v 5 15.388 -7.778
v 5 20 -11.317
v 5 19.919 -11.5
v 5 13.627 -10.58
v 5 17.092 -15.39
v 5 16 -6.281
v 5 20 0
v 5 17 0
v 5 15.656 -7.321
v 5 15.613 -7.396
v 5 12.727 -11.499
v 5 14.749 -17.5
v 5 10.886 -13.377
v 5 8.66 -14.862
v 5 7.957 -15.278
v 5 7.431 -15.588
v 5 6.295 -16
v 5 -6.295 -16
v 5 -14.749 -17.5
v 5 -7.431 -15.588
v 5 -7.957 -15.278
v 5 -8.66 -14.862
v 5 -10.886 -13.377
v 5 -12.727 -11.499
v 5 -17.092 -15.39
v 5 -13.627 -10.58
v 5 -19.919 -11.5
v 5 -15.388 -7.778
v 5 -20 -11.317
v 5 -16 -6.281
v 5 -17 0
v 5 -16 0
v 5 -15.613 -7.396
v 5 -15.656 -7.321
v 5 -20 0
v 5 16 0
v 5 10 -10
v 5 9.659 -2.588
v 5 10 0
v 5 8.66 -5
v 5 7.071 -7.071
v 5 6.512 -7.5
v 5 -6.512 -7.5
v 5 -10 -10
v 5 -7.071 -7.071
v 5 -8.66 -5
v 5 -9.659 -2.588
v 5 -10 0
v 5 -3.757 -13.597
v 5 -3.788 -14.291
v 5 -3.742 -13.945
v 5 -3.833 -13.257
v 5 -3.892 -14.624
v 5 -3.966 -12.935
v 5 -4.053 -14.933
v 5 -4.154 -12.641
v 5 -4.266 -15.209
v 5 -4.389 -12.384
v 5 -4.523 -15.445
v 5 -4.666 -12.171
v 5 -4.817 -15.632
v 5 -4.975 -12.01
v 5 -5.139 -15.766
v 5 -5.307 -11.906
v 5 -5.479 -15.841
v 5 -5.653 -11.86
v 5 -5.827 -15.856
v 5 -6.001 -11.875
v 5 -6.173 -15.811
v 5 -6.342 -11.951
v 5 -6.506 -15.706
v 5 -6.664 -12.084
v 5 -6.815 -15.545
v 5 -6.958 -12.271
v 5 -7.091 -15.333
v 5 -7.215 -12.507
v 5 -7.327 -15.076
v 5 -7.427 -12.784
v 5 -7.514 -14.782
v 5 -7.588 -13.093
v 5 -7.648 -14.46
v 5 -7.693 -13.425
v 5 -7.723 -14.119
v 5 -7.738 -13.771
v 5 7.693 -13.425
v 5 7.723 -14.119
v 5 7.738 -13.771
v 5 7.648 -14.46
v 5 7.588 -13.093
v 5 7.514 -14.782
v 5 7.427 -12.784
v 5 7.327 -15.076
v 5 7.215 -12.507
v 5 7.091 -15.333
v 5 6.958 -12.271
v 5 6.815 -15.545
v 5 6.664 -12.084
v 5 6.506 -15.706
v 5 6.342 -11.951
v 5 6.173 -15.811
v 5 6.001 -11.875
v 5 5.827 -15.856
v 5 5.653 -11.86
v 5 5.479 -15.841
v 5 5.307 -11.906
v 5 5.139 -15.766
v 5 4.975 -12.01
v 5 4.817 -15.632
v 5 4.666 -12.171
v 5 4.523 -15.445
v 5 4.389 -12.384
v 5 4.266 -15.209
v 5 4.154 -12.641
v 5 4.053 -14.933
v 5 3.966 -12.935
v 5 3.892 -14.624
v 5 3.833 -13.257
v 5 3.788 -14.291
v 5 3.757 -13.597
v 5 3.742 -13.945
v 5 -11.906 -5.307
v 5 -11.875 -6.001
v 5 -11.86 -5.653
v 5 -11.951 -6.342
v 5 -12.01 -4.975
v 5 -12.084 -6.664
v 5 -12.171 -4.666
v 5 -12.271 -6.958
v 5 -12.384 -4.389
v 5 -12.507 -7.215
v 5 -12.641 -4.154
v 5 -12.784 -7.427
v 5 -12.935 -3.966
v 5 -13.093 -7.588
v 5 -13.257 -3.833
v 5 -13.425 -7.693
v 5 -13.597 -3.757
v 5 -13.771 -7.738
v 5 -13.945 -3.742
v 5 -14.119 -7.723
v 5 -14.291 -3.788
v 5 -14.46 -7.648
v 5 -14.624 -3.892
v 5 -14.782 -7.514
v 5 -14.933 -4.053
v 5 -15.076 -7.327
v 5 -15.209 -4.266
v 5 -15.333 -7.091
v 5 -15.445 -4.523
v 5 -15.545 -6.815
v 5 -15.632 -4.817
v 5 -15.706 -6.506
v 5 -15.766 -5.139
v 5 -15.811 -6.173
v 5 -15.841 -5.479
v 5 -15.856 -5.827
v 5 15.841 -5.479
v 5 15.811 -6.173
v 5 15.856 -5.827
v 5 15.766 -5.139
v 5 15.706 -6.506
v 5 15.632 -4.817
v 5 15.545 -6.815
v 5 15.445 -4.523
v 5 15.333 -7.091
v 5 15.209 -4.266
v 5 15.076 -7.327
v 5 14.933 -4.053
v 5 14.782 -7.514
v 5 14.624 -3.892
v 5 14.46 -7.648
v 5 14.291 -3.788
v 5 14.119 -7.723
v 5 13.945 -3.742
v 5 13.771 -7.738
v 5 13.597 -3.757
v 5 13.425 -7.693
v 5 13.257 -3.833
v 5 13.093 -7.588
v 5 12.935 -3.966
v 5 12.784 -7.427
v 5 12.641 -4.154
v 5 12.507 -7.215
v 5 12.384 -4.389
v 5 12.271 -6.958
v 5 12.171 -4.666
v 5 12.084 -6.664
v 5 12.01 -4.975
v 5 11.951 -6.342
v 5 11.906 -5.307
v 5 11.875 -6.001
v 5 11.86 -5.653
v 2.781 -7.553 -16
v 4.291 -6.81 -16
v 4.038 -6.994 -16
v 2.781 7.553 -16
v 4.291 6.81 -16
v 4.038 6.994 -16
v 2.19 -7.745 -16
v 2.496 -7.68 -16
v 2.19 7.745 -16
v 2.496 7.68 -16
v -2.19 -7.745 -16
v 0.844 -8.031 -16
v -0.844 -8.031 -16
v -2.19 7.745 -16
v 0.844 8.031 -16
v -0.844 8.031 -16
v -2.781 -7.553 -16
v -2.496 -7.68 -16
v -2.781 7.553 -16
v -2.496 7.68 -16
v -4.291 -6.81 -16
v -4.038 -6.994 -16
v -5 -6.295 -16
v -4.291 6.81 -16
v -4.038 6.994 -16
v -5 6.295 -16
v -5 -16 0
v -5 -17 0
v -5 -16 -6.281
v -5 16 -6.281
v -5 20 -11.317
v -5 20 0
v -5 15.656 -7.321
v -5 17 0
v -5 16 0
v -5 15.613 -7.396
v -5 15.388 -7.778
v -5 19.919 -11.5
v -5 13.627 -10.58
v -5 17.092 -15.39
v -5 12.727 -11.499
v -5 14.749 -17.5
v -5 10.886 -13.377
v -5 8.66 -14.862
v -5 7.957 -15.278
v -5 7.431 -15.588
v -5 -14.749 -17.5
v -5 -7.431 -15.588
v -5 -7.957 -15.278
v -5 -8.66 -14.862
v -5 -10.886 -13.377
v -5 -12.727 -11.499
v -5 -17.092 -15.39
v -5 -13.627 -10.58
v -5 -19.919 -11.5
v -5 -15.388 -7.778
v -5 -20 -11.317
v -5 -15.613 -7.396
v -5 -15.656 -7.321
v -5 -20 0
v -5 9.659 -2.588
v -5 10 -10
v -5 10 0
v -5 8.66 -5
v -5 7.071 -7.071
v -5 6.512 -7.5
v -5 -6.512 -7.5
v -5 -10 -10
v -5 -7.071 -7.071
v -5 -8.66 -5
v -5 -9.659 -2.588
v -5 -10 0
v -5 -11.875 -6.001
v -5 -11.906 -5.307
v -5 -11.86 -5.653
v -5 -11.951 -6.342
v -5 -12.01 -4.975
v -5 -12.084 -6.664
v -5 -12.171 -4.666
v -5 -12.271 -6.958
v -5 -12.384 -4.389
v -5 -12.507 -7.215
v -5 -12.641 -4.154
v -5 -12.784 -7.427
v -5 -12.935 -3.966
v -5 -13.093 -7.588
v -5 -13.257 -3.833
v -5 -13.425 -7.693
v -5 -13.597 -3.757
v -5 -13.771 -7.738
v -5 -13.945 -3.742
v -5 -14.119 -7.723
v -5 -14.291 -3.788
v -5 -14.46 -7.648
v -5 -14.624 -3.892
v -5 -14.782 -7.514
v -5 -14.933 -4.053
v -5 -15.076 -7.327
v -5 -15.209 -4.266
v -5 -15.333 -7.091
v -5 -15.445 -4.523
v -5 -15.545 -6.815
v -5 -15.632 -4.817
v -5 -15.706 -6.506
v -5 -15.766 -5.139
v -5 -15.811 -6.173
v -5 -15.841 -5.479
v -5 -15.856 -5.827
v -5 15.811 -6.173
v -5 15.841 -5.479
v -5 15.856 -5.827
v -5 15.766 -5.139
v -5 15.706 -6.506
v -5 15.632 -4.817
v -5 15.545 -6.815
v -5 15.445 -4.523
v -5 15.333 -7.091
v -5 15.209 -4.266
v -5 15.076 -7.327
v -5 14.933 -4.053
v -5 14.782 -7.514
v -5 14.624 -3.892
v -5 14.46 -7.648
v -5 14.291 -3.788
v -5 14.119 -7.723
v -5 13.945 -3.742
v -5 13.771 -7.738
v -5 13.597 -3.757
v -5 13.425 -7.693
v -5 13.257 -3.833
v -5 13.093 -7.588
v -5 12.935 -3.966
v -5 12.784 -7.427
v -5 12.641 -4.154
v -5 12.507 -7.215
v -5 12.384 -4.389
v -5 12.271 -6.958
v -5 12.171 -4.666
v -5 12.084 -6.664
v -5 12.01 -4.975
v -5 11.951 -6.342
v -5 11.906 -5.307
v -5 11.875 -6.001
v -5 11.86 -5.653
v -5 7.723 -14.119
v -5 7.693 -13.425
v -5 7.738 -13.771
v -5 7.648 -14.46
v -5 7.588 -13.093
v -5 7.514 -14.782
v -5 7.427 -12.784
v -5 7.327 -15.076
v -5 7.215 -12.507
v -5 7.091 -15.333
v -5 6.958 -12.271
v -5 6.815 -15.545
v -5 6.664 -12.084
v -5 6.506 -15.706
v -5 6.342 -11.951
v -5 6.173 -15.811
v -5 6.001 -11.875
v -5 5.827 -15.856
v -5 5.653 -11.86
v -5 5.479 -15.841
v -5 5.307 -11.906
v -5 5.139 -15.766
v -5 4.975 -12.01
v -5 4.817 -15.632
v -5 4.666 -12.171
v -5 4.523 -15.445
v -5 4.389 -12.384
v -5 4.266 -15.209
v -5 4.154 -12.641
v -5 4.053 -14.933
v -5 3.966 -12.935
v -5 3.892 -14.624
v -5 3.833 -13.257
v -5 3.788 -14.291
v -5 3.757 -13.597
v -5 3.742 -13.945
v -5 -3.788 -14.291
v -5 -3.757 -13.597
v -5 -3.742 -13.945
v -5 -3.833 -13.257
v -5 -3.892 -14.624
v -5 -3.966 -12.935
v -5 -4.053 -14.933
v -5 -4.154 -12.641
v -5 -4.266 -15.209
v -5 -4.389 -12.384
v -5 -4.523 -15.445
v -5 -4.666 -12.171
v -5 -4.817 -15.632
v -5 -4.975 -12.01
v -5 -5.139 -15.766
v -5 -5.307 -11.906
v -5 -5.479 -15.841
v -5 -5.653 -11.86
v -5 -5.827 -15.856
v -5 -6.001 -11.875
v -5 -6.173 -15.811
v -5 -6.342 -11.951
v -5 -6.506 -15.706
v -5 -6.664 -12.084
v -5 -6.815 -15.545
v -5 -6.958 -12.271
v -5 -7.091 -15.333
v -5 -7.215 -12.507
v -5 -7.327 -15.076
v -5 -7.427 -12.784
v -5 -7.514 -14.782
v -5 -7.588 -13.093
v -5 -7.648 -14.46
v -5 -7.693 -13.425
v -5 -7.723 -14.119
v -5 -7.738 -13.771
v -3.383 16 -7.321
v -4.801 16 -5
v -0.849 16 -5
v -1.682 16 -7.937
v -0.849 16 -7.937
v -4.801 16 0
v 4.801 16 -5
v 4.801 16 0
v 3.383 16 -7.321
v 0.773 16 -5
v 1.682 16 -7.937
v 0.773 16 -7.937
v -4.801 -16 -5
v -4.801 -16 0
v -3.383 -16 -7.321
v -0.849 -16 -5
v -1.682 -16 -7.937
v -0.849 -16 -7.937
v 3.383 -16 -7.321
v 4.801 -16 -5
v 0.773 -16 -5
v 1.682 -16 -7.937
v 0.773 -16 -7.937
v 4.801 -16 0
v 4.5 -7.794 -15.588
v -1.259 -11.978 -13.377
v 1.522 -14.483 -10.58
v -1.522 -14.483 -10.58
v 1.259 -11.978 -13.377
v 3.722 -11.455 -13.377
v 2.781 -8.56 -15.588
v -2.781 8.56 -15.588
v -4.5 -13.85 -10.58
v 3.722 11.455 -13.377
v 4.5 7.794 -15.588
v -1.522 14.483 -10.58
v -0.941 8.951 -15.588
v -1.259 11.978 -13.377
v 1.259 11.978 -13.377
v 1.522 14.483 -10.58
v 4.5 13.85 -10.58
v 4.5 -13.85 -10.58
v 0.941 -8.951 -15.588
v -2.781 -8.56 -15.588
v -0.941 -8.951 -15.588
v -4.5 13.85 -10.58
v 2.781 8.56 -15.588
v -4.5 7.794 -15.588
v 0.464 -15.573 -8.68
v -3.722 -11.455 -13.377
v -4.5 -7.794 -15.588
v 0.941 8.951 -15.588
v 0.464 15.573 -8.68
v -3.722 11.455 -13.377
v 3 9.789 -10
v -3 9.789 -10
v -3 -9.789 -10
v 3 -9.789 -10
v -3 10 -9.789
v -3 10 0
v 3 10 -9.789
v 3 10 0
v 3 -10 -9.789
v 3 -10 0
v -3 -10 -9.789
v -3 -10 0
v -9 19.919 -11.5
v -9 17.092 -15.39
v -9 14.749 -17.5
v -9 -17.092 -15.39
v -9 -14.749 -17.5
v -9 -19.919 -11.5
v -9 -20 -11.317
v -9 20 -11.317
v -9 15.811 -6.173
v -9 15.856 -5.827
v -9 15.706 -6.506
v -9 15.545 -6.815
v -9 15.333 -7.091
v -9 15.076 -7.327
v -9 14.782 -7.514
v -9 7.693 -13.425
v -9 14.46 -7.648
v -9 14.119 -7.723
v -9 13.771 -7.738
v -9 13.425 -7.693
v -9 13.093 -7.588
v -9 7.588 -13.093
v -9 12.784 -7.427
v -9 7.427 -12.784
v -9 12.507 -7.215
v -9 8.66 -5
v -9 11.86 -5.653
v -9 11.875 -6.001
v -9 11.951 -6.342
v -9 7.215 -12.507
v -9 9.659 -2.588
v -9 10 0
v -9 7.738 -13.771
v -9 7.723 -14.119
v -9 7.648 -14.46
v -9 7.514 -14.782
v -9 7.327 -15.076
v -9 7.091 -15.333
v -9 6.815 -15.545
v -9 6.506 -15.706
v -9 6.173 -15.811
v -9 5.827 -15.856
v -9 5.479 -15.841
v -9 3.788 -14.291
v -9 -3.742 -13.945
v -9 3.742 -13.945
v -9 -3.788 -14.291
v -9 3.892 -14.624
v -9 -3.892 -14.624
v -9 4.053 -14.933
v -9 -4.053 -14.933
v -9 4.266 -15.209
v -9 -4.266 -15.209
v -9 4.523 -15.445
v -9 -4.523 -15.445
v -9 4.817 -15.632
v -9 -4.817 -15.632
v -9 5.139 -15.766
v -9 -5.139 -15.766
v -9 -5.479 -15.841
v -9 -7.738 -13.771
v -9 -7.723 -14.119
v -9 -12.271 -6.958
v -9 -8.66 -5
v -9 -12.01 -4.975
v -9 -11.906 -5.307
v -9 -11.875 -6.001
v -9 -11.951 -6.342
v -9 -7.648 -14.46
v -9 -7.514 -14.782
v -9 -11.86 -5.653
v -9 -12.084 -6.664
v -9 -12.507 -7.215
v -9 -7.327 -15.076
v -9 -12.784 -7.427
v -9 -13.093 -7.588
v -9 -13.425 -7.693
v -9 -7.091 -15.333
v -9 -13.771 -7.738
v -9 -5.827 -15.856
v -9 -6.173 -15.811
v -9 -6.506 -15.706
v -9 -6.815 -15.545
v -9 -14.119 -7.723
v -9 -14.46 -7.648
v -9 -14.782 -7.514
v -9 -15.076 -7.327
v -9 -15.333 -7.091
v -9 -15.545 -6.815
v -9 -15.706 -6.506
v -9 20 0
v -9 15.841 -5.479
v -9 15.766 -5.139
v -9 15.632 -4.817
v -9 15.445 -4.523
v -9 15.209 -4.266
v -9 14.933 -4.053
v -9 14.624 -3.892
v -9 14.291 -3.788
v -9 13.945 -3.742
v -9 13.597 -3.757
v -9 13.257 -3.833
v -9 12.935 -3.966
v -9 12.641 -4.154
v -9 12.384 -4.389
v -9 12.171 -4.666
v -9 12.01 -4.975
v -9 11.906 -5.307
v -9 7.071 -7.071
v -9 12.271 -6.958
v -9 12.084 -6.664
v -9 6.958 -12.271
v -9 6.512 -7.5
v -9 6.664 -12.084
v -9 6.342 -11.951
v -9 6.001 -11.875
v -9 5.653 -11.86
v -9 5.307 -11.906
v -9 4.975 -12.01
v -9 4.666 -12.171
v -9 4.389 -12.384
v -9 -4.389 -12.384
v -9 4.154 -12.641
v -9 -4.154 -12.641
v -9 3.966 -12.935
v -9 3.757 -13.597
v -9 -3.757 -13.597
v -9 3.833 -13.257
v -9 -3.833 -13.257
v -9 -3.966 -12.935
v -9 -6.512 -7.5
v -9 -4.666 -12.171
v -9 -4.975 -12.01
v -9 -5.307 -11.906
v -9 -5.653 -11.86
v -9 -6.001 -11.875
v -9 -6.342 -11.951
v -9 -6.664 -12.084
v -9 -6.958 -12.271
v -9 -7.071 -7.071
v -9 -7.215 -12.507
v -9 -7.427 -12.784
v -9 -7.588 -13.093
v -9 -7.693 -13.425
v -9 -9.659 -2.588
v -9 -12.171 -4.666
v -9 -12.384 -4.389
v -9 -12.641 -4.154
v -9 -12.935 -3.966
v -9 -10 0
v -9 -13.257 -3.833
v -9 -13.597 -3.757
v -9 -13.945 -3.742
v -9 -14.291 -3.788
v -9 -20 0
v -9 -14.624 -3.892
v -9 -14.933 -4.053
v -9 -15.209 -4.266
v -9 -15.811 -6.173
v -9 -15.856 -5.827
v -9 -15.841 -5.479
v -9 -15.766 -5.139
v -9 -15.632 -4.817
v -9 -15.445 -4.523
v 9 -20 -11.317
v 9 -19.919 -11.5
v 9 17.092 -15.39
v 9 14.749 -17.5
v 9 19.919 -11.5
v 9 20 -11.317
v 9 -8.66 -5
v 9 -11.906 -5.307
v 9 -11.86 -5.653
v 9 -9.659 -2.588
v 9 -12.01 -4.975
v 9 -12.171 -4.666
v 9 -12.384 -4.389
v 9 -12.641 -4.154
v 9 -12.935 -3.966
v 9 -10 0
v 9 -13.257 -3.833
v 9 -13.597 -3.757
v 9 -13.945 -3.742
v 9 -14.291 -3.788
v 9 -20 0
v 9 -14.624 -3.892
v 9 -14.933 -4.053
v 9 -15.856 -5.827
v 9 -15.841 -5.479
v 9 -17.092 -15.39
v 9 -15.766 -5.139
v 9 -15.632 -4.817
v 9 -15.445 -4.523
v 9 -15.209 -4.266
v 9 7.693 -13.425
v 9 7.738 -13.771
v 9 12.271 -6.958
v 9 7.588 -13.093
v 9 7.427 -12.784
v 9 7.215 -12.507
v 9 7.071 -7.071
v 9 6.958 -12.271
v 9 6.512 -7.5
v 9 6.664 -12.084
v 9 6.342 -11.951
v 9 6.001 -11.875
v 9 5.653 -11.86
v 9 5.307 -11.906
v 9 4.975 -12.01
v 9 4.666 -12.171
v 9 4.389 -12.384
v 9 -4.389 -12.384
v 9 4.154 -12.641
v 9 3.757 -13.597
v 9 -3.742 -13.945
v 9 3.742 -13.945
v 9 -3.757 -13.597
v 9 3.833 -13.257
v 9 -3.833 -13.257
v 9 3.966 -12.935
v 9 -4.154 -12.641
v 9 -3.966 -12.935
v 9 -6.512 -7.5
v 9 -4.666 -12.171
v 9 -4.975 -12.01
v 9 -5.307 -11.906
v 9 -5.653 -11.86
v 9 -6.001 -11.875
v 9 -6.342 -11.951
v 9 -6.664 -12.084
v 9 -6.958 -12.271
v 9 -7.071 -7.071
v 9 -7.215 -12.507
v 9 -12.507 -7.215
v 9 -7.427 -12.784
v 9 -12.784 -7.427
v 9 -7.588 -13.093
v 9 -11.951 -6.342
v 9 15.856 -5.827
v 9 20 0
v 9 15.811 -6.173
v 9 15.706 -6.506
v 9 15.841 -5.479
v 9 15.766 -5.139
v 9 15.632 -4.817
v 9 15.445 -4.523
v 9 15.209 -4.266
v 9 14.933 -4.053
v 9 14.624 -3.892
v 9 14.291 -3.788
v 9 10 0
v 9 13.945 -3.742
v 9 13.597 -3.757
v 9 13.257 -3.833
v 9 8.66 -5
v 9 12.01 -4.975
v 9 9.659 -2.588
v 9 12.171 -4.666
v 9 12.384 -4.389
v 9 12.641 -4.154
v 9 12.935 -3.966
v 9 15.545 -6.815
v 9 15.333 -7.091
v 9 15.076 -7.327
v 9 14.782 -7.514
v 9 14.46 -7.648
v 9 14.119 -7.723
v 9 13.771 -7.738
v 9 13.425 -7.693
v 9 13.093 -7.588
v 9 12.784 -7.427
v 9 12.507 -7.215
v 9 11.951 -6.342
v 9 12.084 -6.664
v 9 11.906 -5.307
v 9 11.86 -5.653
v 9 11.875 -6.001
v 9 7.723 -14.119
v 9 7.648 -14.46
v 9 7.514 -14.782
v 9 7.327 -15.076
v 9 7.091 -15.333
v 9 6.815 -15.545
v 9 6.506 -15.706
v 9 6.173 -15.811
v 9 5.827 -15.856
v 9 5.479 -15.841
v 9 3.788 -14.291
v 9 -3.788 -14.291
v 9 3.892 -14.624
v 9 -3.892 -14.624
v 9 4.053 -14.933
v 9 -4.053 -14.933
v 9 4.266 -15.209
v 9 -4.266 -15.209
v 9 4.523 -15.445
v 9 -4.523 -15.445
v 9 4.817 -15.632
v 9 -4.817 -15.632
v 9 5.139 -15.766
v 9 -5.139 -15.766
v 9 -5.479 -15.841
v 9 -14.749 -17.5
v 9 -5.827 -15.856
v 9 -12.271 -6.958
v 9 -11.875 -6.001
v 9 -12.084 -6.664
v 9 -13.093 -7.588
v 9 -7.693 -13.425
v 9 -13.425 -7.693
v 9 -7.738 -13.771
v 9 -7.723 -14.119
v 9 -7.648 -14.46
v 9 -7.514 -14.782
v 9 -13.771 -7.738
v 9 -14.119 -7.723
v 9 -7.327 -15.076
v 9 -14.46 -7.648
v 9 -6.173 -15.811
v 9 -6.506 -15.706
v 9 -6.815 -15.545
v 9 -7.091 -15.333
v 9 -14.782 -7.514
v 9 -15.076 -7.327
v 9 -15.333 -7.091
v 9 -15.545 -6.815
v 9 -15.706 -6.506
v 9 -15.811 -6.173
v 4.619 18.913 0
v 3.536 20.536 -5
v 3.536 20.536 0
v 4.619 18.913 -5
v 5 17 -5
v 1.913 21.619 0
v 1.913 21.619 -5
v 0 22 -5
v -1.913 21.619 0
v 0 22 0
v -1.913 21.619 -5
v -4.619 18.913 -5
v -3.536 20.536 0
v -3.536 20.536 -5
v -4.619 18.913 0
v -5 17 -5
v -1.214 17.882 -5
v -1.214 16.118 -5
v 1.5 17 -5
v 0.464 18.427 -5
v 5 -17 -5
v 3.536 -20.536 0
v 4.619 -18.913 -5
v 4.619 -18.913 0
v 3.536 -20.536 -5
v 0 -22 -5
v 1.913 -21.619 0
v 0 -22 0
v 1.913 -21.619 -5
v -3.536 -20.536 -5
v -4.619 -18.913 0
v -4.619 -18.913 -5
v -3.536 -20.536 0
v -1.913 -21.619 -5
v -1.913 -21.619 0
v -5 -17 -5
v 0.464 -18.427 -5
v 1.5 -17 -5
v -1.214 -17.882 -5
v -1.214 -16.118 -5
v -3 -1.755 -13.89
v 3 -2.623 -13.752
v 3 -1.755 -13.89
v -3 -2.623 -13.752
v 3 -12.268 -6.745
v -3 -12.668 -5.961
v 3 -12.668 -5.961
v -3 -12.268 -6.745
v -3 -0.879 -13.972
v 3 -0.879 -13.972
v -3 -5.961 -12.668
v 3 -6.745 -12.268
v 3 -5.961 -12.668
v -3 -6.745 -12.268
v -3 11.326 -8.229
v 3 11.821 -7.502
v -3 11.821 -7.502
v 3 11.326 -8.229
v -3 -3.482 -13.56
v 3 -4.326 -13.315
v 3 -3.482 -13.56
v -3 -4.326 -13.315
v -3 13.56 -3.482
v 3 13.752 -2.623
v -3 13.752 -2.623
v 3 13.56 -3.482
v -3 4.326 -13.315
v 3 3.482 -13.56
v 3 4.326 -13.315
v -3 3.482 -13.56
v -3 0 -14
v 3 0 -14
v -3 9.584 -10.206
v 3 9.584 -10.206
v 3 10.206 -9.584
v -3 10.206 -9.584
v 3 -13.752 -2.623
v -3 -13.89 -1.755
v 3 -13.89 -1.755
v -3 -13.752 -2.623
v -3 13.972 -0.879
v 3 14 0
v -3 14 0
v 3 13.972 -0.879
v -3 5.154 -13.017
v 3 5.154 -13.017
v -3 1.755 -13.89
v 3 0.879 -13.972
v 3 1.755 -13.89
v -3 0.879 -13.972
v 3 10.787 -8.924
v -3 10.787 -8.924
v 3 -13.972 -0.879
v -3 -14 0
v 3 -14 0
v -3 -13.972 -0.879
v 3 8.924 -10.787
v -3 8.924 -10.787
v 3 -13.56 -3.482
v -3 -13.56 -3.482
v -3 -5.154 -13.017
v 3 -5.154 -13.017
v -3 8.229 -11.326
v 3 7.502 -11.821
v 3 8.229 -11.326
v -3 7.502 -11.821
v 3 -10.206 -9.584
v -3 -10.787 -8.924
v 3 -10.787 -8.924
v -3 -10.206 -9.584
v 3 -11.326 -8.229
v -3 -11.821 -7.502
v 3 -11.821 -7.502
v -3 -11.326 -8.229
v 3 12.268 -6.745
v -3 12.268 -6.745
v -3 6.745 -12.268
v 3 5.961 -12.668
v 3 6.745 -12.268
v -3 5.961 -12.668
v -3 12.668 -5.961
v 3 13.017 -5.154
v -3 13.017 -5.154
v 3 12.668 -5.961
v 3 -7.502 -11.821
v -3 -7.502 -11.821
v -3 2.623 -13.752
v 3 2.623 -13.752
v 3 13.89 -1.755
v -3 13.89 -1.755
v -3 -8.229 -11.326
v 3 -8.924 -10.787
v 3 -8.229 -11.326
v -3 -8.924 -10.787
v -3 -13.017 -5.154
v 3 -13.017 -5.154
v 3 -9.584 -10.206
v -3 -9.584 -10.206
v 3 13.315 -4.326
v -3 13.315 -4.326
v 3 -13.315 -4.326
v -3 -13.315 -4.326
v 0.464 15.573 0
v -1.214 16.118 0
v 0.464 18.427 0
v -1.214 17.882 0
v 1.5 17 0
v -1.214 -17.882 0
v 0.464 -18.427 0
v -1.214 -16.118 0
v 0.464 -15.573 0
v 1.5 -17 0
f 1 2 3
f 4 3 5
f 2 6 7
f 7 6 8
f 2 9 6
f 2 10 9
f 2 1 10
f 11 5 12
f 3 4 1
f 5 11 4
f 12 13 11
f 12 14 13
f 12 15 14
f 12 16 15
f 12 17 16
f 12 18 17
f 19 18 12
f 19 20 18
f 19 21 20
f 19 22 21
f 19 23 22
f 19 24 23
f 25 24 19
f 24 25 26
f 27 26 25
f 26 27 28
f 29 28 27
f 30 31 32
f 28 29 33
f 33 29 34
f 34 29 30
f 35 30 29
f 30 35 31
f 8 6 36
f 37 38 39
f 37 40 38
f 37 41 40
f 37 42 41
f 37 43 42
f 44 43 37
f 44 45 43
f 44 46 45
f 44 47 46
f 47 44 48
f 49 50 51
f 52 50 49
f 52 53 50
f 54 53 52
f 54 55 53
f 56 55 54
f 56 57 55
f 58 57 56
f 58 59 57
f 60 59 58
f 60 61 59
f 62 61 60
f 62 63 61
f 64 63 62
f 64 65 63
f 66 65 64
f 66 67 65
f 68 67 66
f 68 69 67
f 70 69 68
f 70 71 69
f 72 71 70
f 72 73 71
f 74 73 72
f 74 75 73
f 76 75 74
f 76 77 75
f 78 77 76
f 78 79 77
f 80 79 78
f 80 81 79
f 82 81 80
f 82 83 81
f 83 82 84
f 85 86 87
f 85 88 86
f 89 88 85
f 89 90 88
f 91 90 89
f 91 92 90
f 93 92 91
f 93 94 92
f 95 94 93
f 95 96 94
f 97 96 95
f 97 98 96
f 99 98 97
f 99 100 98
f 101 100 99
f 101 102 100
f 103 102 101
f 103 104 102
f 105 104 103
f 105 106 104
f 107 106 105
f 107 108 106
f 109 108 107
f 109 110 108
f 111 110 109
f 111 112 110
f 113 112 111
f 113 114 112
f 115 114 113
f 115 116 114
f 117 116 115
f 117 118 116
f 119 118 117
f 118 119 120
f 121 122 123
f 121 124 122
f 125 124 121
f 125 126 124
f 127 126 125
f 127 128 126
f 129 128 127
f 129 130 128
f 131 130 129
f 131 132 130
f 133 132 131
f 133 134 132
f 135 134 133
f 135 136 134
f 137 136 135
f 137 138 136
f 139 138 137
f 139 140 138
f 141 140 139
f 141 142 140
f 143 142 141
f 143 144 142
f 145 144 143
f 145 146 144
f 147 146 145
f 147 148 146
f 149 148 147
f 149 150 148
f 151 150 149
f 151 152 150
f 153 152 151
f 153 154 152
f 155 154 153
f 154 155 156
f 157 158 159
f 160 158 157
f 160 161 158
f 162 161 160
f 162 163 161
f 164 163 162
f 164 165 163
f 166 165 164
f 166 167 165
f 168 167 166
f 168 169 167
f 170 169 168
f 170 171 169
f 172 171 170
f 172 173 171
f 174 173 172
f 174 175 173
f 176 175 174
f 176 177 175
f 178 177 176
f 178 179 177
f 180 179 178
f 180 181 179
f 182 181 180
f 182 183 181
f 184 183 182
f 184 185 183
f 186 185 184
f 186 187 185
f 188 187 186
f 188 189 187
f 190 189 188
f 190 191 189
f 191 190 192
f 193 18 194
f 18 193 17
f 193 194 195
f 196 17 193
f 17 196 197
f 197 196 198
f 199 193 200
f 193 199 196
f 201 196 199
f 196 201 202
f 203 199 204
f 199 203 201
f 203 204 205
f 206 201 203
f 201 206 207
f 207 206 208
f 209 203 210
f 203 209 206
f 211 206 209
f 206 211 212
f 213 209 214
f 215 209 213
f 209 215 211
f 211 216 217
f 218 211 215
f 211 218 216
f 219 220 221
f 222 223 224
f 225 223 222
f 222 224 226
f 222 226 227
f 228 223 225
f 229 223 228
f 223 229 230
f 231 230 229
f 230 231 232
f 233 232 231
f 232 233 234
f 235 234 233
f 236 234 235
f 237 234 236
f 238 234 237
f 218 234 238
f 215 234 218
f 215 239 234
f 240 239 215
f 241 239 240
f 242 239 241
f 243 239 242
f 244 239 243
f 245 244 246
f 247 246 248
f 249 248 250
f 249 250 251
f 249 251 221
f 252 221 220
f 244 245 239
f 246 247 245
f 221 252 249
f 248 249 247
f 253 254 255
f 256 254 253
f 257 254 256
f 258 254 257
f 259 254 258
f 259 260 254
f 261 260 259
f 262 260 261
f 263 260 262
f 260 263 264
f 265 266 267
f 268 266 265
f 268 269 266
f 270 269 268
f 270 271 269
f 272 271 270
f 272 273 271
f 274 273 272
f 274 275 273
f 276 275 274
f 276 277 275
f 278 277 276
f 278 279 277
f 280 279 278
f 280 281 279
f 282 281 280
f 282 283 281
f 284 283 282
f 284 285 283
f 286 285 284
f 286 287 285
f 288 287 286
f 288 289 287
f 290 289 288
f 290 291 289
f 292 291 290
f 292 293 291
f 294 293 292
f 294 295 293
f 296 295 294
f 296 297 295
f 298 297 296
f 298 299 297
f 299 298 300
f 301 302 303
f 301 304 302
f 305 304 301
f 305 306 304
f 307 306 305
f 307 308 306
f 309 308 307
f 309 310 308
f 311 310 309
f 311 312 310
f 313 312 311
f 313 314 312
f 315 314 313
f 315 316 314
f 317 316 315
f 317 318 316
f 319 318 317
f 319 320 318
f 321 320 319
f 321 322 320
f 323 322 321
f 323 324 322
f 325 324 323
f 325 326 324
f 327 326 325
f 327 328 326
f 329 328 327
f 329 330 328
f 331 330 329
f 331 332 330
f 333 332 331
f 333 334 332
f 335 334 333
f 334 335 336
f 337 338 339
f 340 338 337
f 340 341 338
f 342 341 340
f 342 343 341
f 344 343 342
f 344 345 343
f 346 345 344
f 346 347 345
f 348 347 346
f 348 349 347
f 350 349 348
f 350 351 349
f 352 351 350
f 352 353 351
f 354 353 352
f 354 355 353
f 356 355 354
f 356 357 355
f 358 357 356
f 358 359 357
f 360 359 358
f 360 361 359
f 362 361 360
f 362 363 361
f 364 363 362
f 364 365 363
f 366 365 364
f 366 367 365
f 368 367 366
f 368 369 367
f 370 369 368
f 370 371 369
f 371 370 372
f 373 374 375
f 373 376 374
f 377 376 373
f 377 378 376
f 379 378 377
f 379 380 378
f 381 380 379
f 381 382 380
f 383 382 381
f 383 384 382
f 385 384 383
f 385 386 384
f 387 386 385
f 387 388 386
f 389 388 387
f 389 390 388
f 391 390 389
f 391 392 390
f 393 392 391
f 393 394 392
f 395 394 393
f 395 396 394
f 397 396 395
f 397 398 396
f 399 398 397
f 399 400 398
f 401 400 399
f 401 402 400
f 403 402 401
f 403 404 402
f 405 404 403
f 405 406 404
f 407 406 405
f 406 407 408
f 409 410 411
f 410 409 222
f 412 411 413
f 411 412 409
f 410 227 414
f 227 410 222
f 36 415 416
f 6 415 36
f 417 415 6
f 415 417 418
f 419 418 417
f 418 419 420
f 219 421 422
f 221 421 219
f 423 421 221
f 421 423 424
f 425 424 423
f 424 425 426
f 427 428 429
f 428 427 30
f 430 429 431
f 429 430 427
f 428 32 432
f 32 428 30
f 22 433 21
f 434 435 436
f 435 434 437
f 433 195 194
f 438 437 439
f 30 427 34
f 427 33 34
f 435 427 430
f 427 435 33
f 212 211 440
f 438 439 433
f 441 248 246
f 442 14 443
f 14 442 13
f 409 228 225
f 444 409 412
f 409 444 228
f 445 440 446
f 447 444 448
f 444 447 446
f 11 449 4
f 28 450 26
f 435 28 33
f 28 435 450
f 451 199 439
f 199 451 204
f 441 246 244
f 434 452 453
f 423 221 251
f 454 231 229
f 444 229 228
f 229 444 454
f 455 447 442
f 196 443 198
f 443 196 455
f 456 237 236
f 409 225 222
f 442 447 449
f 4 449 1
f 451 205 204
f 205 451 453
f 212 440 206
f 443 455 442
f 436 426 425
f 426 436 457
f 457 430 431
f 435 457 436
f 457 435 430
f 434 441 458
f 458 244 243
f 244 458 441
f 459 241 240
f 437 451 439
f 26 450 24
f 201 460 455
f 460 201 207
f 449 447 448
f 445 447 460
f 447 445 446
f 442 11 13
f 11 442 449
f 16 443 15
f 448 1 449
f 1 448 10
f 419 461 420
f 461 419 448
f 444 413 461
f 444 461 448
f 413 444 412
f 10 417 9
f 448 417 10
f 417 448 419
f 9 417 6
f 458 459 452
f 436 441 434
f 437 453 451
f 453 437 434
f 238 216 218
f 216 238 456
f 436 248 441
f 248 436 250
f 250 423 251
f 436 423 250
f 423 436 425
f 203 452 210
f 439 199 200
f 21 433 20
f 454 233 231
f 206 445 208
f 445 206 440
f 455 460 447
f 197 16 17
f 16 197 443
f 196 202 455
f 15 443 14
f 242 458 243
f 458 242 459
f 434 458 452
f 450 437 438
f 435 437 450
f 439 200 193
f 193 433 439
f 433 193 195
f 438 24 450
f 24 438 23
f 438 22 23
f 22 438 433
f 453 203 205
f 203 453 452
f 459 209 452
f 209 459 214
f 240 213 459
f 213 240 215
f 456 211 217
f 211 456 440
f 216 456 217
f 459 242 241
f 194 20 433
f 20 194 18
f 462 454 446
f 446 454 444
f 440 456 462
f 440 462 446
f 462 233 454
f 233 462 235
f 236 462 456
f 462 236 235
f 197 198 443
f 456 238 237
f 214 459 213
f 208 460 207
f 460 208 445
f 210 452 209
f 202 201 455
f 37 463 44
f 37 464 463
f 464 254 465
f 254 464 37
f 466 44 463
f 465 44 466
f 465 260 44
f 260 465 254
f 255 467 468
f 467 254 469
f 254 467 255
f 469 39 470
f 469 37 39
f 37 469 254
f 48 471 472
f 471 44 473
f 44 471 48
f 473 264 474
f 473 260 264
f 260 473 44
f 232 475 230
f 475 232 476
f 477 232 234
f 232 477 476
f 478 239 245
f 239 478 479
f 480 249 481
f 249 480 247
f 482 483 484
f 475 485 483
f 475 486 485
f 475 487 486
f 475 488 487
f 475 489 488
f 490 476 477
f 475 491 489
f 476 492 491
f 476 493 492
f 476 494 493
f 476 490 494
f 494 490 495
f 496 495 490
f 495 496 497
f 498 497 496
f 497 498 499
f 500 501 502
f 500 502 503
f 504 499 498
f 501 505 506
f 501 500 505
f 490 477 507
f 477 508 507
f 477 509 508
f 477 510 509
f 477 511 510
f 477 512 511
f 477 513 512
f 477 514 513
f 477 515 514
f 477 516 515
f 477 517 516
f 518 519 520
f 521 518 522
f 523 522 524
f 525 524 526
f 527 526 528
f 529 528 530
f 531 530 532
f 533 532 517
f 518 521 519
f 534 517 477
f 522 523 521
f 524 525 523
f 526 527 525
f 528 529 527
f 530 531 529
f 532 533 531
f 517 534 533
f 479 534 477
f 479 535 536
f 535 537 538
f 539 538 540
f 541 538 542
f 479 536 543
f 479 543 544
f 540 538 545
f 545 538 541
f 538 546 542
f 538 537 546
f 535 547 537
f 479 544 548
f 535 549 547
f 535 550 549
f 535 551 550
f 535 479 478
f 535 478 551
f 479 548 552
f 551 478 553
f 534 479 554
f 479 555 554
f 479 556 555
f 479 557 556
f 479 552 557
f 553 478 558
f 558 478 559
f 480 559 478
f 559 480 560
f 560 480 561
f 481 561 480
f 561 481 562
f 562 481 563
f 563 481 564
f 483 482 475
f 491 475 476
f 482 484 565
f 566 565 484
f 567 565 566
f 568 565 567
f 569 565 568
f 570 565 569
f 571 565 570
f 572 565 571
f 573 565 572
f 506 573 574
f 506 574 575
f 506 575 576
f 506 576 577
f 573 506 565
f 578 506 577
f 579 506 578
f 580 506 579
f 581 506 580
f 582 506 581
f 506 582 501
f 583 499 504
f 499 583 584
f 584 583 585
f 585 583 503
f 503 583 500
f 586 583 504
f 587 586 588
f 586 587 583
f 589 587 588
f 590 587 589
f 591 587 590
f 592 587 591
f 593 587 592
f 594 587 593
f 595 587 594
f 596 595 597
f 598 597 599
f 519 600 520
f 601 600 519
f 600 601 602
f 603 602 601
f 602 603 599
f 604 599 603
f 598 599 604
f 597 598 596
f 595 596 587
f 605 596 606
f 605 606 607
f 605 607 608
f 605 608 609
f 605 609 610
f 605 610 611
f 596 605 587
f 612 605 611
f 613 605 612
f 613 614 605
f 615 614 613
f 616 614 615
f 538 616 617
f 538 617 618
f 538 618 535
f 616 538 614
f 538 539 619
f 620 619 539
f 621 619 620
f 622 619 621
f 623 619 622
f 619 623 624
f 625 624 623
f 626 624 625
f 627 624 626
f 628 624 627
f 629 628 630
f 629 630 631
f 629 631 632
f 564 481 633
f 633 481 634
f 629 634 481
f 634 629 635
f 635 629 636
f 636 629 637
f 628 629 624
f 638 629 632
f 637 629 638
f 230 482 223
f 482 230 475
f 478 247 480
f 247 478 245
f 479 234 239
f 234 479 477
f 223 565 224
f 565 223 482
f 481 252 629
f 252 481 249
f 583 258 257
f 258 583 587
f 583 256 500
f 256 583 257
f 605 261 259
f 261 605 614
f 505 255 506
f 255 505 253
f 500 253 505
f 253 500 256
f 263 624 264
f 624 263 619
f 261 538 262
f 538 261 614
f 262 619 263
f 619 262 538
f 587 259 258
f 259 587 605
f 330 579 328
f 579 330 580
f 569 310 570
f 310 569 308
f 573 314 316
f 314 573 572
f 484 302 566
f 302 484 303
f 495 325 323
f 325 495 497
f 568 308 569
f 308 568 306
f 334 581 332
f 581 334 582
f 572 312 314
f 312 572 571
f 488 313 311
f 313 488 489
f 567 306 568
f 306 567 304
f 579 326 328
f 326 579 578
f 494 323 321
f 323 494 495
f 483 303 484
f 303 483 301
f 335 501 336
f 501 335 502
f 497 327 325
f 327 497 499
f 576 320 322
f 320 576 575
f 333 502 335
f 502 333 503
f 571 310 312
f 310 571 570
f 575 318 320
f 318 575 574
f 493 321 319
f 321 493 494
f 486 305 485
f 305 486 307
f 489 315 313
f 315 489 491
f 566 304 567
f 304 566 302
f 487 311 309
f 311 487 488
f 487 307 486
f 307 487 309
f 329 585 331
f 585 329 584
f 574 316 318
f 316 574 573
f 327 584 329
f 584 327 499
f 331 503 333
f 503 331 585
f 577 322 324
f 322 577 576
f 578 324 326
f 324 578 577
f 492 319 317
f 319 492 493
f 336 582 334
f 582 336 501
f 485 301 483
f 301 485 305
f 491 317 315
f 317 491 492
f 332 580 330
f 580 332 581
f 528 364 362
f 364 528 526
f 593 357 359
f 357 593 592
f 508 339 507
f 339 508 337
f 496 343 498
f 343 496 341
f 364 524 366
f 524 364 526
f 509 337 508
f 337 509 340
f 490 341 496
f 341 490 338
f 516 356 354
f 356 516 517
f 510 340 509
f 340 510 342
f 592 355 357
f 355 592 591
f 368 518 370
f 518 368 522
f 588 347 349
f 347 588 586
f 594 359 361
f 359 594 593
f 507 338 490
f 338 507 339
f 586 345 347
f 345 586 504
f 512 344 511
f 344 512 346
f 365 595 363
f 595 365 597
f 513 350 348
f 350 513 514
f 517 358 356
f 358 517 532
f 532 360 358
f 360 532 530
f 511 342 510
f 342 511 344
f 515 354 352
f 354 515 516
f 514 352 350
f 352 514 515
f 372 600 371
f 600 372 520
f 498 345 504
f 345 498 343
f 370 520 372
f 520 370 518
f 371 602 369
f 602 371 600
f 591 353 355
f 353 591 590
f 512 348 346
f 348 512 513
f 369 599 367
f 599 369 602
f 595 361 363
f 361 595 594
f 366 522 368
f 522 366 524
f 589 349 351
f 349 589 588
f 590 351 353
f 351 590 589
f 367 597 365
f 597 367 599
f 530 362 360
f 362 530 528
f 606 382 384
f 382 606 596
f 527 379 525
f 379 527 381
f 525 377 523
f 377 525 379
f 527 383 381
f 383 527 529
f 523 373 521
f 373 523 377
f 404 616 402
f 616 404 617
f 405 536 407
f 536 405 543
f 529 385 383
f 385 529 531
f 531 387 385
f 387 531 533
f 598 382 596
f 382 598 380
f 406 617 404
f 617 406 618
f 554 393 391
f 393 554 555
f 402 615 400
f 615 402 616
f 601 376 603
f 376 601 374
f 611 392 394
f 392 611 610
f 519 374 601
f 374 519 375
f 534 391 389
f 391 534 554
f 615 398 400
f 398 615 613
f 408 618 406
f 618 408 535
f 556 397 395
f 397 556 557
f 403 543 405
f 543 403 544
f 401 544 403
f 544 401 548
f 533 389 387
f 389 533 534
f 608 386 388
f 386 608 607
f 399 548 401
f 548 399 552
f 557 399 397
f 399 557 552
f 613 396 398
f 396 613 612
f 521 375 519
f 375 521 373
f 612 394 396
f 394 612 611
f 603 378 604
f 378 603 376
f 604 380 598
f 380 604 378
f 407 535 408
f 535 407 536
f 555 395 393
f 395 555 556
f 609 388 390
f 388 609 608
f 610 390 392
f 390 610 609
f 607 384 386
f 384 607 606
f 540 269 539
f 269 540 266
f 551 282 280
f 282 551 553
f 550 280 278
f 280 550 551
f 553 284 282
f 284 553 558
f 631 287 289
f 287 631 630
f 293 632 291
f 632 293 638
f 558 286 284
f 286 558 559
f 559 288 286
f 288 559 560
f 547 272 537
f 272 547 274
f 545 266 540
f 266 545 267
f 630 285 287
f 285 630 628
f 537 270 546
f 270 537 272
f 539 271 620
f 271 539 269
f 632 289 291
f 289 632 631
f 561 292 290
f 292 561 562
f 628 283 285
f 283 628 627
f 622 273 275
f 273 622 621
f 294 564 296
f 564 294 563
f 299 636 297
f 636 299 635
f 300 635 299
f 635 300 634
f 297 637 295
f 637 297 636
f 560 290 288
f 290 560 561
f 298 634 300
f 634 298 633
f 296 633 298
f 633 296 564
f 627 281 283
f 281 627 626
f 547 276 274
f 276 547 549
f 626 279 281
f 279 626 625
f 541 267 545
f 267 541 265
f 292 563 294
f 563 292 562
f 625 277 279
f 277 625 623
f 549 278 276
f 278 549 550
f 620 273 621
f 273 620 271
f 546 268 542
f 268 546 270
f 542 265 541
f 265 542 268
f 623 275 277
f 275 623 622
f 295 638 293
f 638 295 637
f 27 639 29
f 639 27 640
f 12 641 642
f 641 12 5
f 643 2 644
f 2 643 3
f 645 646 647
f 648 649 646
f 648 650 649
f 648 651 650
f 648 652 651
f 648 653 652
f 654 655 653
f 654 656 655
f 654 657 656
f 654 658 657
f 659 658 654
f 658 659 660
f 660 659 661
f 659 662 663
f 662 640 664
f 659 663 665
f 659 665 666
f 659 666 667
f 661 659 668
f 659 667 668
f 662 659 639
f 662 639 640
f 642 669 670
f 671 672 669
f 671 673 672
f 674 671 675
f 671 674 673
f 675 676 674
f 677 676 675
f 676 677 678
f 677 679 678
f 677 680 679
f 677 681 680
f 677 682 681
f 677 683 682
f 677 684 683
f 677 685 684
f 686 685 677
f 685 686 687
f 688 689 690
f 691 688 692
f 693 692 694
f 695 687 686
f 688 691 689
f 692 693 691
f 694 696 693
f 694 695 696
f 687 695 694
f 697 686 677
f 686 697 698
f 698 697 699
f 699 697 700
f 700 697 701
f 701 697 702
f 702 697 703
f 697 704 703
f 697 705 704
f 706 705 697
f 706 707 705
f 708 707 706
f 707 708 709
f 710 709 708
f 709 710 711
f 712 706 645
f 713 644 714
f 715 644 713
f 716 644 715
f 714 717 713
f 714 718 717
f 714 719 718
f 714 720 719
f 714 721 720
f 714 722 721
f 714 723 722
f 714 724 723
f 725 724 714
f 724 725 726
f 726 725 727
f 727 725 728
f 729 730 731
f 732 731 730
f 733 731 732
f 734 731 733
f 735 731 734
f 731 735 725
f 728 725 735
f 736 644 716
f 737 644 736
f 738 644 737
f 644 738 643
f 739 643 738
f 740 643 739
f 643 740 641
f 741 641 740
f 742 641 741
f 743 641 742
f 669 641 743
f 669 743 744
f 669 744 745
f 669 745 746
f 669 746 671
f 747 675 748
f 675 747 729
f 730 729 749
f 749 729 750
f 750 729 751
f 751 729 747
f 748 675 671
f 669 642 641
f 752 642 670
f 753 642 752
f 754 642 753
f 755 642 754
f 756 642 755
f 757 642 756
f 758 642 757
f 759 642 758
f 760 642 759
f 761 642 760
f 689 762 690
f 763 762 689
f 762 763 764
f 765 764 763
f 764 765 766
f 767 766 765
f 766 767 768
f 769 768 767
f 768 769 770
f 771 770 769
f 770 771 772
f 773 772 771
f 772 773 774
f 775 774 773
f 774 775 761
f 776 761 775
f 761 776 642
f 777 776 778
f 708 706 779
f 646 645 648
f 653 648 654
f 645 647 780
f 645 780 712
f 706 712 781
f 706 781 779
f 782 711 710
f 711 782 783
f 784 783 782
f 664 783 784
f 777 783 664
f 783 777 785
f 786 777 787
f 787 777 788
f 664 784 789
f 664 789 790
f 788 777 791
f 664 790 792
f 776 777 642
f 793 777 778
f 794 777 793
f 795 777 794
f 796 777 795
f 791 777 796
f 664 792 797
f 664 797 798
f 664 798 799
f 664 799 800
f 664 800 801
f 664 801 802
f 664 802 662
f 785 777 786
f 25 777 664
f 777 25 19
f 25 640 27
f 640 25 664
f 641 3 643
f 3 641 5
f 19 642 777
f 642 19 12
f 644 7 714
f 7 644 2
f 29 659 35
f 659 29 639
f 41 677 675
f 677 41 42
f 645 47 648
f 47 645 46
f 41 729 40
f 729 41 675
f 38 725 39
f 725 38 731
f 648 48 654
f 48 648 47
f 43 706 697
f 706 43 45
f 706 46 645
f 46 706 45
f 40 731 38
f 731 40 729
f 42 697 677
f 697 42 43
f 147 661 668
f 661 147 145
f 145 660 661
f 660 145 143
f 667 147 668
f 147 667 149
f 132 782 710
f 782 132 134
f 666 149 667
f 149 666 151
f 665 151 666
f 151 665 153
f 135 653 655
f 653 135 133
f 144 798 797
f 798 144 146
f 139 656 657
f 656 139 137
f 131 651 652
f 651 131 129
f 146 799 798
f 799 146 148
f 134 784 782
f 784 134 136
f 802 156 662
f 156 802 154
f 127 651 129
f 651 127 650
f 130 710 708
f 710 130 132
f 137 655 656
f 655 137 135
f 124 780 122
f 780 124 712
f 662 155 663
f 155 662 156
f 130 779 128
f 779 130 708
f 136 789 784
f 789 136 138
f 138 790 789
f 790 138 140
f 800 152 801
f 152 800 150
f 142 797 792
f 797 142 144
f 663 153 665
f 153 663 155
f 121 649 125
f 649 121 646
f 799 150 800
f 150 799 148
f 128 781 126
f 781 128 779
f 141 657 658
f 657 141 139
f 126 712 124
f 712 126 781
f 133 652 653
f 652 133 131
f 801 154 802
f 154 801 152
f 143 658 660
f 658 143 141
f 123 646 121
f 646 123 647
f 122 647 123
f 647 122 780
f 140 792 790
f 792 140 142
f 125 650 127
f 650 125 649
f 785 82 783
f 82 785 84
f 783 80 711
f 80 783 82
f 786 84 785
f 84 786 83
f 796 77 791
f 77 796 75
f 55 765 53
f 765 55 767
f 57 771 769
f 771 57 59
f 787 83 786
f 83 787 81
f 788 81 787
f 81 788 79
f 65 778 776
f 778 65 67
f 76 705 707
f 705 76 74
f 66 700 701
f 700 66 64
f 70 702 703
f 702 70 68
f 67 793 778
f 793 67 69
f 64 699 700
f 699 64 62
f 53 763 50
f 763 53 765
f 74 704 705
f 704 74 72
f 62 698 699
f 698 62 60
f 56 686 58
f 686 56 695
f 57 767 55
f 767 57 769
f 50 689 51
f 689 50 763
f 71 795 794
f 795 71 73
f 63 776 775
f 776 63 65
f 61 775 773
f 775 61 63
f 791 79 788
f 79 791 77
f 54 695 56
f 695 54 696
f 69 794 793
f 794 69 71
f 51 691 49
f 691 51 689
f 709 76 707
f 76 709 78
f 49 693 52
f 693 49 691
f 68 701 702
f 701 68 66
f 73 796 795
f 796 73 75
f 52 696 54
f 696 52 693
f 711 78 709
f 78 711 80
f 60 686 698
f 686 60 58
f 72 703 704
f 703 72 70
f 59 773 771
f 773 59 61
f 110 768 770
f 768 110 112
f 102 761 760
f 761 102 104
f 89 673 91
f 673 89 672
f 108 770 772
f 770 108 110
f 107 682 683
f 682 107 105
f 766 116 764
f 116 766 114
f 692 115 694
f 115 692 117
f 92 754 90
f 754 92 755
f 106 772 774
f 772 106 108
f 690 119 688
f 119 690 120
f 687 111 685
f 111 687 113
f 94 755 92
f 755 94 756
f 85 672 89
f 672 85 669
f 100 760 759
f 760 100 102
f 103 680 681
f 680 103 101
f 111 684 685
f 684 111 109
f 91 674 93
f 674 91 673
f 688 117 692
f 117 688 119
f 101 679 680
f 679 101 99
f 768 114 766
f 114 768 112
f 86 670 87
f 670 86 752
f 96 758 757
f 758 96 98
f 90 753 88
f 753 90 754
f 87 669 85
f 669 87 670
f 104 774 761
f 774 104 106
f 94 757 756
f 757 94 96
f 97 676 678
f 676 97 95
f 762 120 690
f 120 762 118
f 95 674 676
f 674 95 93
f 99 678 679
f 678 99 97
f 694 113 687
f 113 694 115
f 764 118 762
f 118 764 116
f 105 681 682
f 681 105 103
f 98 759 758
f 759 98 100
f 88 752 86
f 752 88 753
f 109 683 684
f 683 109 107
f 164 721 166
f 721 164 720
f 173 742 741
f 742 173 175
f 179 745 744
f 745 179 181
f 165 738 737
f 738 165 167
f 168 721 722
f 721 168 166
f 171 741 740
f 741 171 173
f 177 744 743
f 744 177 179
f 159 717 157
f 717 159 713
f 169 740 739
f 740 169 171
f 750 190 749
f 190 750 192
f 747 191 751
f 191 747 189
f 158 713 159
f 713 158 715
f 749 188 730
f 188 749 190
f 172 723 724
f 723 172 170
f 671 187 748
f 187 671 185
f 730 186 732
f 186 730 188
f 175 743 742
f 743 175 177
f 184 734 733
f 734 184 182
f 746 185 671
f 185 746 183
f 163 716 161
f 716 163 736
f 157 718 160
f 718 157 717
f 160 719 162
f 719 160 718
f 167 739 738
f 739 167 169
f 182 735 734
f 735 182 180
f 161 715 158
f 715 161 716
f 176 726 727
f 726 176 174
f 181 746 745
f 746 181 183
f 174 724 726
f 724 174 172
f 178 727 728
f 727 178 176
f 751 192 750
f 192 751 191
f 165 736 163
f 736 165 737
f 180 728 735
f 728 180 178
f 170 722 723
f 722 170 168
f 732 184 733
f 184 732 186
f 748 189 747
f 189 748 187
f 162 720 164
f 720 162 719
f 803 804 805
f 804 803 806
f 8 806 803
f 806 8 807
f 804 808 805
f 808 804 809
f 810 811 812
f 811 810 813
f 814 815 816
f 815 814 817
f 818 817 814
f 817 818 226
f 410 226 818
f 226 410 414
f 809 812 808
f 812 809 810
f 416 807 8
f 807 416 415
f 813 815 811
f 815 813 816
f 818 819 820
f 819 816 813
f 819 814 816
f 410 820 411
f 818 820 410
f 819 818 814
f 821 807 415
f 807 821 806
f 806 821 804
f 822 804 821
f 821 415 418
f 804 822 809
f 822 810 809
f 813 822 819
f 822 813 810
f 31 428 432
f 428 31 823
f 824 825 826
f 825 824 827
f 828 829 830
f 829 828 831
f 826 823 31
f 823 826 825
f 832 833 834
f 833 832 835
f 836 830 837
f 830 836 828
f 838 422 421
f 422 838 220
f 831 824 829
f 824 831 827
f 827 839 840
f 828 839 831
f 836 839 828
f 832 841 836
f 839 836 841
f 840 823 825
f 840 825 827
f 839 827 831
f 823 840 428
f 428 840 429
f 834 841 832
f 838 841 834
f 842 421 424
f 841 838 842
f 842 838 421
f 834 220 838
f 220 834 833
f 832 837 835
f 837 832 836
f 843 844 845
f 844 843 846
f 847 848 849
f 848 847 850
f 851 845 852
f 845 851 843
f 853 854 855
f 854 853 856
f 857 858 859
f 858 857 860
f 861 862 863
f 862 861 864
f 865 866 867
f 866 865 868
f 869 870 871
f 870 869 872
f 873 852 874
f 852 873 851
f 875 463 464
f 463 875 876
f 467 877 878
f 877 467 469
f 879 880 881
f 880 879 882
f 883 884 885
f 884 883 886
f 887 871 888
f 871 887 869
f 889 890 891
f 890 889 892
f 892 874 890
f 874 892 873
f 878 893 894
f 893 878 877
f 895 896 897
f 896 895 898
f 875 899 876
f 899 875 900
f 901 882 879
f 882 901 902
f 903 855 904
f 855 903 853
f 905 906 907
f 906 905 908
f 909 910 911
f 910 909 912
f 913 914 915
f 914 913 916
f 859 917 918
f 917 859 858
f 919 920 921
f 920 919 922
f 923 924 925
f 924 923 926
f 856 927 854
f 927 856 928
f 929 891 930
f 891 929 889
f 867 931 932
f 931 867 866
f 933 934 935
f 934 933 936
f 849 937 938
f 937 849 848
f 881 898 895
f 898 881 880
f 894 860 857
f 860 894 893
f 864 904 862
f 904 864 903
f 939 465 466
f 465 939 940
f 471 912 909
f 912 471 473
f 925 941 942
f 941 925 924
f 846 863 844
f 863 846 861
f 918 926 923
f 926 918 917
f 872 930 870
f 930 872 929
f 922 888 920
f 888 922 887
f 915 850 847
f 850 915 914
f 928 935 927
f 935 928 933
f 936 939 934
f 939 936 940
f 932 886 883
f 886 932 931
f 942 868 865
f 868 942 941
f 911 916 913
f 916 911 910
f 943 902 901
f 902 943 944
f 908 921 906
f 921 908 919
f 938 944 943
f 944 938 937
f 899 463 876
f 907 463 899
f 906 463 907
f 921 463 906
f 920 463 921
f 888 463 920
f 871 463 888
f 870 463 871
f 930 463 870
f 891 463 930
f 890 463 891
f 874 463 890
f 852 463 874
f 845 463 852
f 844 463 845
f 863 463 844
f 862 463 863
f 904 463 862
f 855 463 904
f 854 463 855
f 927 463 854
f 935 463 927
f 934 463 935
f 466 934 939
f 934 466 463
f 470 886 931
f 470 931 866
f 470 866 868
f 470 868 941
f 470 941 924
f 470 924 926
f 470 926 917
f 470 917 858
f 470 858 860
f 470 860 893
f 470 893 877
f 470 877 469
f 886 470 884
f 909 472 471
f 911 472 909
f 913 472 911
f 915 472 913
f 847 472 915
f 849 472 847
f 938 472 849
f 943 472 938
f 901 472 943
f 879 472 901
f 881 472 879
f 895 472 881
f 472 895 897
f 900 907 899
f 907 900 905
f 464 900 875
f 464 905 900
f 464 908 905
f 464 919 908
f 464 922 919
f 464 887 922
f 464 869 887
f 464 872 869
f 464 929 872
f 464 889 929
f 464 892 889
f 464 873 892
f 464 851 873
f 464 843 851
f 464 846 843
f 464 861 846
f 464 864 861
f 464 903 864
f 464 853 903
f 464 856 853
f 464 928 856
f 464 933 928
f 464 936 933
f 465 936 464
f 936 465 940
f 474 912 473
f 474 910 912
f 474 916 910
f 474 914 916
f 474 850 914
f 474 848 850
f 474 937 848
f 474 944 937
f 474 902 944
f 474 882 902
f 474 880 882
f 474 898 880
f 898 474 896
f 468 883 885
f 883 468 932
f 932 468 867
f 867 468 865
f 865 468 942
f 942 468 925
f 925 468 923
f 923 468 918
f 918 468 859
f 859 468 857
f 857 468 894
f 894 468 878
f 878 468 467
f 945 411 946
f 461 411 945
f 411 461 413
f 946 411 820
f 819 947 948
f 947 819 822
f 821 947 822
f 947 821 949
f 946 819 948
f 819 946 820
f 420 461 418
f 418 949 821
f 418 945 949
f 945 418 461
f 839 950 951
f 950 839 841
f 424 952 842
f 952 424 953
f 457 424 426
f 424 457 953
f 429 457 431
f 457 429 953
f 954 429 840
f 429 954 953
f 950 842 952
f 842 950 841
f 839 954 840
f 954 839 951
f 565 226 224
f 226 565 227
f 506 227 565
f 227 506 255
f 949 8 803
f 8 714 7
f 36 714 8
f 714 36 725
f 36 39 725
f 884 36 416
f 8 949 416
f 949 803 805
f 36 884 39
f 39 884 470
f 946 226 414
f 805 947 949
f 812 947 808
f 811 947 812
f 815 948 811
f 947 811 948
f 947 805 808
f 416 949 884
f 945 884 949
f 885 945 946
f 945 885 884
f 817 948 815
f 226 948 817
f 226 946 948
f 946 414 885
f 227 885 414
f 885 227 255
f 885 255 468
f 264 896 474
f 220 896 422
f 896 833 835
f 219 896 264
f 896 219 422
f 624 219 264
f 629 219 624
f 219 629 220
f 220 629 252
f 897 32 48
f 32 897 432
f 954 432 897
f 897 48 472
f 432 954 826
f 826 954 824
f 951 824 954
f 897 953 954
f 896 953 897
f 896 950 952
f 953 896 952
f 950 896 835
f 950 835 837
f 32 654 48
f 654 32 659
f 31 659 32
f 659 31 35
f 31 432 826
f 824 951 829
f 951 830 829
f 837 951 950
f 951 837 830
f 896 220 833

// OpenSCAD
// file: std_mechanical_object_flange3.scad
module flangeBody(){
	difference(){
		//tubeBody
		intersection(){
			translate([5,0,0]) rotate([0,90,0]) cylinder(h=12,r=12,center=true);
			translate([5,0,0]) cube(size=[20,20,20],center=true);
		}
		//throat
		intersection(){
			translate([5,0,0]) rotate([0,90,0]) cylinder(h=13,r=10,center=true);
			translate([5,0,0]) cube(size=[15,15,15],center=true);
		}
	}
}

module flangeFace(){
	difference(){
		union(){
			difference(){
				//flange
				intersection(){
					translate([12,0,0]) rotate([0,90,0]) cylinder(r=23,h=4,center=true);
					translate([12,0,0]) cube(size=[10,40,35],center=true);
				}
				//flangeThroat
				intersection(){
					translate([12,0,0]) rotate([0,90,0]) cylinder(r=10,h=5,$fn=24,center=true);
					translate([12,0,0]) cube(size=[10,20,15],center=true);
				}
			}
		}
		//tubeMountingHoles
		rotate([22.5,0,0]){
			for ( v = [0 : 8] ){
				rotate( v * 360 / 8, [1, 0, 0]){
					translate([12, 15, 0]){
						rotate([0,90,0]){
							cylinder(r=2,h=5,$fn=36,center=true);
						}
					}
				}
			}
		}
	}
}

module flange(){
	union(){
		flangeBody();
		flangeFace();
	}
}

flange();
// main file
use <std_mechanical_object_flange3.scad>

module passFilter(){
	translate ([0,0,0]) rotate([0,90,0]) color([0,.5,0]) cylinder(r=13,h=5,$fn=100,center=true);
}

module passFilterBody(){
	union(){
		difference(){
			//mainBody
			intersection(){
				cube(size=[10,32,32],center=true);
				sphere(r=18,center=true);
			}
			//laserPath
//			intersection(){
				cube(size=[40,20,20],center=true);
//				rotate([0,90,0]) cylinder(r=12,h=45,center=true);
//			}
		}
		//screwHoles
		translate([0,17,0]) cylinder(r=5,h=10,center=true);
		translate([0,-17,0]) cylinder(r=5,h=10,center=true);
			//flange
			rotate([0,180,0]){ 
				translate([-5,0,0]){
					difference(){
						flangeFace();
						cube(size=[6,24,24],center=true);
					}
				}
			}
			//flange
			rotate([0,0,0]){
				translate([-5,0,0]){
					difference(){
						 flangeFace();
						cube(size=[6,25,24],center=true);
					}
				}
			}
	}
}

module passFilter_mount_bottom(){
	difference(){
		passFilterBody();
		//filterSlot
		translate ([0,0,0]) rotate([0,90,0]) cylinder(r=14,h=6,$fn=100,center=true);
		//screwHoles
		translate([0,17,-5]) cylinder(r=1.5,h=14,center=true);
		translate([0,-17,-5]) cylinder(r=1.5,h=14,center=true);

		translate([0,17,8]) cylinder(r=3,h=14,center=true);
		translate([0,-17,8]) cylinder(r=3,h=14,center=true);
		//topChop
		translate([0,0,11]) cube(size=[50,50,22],center=true);
	}
}

//passFilter();
passFilter_mount_bottom();
